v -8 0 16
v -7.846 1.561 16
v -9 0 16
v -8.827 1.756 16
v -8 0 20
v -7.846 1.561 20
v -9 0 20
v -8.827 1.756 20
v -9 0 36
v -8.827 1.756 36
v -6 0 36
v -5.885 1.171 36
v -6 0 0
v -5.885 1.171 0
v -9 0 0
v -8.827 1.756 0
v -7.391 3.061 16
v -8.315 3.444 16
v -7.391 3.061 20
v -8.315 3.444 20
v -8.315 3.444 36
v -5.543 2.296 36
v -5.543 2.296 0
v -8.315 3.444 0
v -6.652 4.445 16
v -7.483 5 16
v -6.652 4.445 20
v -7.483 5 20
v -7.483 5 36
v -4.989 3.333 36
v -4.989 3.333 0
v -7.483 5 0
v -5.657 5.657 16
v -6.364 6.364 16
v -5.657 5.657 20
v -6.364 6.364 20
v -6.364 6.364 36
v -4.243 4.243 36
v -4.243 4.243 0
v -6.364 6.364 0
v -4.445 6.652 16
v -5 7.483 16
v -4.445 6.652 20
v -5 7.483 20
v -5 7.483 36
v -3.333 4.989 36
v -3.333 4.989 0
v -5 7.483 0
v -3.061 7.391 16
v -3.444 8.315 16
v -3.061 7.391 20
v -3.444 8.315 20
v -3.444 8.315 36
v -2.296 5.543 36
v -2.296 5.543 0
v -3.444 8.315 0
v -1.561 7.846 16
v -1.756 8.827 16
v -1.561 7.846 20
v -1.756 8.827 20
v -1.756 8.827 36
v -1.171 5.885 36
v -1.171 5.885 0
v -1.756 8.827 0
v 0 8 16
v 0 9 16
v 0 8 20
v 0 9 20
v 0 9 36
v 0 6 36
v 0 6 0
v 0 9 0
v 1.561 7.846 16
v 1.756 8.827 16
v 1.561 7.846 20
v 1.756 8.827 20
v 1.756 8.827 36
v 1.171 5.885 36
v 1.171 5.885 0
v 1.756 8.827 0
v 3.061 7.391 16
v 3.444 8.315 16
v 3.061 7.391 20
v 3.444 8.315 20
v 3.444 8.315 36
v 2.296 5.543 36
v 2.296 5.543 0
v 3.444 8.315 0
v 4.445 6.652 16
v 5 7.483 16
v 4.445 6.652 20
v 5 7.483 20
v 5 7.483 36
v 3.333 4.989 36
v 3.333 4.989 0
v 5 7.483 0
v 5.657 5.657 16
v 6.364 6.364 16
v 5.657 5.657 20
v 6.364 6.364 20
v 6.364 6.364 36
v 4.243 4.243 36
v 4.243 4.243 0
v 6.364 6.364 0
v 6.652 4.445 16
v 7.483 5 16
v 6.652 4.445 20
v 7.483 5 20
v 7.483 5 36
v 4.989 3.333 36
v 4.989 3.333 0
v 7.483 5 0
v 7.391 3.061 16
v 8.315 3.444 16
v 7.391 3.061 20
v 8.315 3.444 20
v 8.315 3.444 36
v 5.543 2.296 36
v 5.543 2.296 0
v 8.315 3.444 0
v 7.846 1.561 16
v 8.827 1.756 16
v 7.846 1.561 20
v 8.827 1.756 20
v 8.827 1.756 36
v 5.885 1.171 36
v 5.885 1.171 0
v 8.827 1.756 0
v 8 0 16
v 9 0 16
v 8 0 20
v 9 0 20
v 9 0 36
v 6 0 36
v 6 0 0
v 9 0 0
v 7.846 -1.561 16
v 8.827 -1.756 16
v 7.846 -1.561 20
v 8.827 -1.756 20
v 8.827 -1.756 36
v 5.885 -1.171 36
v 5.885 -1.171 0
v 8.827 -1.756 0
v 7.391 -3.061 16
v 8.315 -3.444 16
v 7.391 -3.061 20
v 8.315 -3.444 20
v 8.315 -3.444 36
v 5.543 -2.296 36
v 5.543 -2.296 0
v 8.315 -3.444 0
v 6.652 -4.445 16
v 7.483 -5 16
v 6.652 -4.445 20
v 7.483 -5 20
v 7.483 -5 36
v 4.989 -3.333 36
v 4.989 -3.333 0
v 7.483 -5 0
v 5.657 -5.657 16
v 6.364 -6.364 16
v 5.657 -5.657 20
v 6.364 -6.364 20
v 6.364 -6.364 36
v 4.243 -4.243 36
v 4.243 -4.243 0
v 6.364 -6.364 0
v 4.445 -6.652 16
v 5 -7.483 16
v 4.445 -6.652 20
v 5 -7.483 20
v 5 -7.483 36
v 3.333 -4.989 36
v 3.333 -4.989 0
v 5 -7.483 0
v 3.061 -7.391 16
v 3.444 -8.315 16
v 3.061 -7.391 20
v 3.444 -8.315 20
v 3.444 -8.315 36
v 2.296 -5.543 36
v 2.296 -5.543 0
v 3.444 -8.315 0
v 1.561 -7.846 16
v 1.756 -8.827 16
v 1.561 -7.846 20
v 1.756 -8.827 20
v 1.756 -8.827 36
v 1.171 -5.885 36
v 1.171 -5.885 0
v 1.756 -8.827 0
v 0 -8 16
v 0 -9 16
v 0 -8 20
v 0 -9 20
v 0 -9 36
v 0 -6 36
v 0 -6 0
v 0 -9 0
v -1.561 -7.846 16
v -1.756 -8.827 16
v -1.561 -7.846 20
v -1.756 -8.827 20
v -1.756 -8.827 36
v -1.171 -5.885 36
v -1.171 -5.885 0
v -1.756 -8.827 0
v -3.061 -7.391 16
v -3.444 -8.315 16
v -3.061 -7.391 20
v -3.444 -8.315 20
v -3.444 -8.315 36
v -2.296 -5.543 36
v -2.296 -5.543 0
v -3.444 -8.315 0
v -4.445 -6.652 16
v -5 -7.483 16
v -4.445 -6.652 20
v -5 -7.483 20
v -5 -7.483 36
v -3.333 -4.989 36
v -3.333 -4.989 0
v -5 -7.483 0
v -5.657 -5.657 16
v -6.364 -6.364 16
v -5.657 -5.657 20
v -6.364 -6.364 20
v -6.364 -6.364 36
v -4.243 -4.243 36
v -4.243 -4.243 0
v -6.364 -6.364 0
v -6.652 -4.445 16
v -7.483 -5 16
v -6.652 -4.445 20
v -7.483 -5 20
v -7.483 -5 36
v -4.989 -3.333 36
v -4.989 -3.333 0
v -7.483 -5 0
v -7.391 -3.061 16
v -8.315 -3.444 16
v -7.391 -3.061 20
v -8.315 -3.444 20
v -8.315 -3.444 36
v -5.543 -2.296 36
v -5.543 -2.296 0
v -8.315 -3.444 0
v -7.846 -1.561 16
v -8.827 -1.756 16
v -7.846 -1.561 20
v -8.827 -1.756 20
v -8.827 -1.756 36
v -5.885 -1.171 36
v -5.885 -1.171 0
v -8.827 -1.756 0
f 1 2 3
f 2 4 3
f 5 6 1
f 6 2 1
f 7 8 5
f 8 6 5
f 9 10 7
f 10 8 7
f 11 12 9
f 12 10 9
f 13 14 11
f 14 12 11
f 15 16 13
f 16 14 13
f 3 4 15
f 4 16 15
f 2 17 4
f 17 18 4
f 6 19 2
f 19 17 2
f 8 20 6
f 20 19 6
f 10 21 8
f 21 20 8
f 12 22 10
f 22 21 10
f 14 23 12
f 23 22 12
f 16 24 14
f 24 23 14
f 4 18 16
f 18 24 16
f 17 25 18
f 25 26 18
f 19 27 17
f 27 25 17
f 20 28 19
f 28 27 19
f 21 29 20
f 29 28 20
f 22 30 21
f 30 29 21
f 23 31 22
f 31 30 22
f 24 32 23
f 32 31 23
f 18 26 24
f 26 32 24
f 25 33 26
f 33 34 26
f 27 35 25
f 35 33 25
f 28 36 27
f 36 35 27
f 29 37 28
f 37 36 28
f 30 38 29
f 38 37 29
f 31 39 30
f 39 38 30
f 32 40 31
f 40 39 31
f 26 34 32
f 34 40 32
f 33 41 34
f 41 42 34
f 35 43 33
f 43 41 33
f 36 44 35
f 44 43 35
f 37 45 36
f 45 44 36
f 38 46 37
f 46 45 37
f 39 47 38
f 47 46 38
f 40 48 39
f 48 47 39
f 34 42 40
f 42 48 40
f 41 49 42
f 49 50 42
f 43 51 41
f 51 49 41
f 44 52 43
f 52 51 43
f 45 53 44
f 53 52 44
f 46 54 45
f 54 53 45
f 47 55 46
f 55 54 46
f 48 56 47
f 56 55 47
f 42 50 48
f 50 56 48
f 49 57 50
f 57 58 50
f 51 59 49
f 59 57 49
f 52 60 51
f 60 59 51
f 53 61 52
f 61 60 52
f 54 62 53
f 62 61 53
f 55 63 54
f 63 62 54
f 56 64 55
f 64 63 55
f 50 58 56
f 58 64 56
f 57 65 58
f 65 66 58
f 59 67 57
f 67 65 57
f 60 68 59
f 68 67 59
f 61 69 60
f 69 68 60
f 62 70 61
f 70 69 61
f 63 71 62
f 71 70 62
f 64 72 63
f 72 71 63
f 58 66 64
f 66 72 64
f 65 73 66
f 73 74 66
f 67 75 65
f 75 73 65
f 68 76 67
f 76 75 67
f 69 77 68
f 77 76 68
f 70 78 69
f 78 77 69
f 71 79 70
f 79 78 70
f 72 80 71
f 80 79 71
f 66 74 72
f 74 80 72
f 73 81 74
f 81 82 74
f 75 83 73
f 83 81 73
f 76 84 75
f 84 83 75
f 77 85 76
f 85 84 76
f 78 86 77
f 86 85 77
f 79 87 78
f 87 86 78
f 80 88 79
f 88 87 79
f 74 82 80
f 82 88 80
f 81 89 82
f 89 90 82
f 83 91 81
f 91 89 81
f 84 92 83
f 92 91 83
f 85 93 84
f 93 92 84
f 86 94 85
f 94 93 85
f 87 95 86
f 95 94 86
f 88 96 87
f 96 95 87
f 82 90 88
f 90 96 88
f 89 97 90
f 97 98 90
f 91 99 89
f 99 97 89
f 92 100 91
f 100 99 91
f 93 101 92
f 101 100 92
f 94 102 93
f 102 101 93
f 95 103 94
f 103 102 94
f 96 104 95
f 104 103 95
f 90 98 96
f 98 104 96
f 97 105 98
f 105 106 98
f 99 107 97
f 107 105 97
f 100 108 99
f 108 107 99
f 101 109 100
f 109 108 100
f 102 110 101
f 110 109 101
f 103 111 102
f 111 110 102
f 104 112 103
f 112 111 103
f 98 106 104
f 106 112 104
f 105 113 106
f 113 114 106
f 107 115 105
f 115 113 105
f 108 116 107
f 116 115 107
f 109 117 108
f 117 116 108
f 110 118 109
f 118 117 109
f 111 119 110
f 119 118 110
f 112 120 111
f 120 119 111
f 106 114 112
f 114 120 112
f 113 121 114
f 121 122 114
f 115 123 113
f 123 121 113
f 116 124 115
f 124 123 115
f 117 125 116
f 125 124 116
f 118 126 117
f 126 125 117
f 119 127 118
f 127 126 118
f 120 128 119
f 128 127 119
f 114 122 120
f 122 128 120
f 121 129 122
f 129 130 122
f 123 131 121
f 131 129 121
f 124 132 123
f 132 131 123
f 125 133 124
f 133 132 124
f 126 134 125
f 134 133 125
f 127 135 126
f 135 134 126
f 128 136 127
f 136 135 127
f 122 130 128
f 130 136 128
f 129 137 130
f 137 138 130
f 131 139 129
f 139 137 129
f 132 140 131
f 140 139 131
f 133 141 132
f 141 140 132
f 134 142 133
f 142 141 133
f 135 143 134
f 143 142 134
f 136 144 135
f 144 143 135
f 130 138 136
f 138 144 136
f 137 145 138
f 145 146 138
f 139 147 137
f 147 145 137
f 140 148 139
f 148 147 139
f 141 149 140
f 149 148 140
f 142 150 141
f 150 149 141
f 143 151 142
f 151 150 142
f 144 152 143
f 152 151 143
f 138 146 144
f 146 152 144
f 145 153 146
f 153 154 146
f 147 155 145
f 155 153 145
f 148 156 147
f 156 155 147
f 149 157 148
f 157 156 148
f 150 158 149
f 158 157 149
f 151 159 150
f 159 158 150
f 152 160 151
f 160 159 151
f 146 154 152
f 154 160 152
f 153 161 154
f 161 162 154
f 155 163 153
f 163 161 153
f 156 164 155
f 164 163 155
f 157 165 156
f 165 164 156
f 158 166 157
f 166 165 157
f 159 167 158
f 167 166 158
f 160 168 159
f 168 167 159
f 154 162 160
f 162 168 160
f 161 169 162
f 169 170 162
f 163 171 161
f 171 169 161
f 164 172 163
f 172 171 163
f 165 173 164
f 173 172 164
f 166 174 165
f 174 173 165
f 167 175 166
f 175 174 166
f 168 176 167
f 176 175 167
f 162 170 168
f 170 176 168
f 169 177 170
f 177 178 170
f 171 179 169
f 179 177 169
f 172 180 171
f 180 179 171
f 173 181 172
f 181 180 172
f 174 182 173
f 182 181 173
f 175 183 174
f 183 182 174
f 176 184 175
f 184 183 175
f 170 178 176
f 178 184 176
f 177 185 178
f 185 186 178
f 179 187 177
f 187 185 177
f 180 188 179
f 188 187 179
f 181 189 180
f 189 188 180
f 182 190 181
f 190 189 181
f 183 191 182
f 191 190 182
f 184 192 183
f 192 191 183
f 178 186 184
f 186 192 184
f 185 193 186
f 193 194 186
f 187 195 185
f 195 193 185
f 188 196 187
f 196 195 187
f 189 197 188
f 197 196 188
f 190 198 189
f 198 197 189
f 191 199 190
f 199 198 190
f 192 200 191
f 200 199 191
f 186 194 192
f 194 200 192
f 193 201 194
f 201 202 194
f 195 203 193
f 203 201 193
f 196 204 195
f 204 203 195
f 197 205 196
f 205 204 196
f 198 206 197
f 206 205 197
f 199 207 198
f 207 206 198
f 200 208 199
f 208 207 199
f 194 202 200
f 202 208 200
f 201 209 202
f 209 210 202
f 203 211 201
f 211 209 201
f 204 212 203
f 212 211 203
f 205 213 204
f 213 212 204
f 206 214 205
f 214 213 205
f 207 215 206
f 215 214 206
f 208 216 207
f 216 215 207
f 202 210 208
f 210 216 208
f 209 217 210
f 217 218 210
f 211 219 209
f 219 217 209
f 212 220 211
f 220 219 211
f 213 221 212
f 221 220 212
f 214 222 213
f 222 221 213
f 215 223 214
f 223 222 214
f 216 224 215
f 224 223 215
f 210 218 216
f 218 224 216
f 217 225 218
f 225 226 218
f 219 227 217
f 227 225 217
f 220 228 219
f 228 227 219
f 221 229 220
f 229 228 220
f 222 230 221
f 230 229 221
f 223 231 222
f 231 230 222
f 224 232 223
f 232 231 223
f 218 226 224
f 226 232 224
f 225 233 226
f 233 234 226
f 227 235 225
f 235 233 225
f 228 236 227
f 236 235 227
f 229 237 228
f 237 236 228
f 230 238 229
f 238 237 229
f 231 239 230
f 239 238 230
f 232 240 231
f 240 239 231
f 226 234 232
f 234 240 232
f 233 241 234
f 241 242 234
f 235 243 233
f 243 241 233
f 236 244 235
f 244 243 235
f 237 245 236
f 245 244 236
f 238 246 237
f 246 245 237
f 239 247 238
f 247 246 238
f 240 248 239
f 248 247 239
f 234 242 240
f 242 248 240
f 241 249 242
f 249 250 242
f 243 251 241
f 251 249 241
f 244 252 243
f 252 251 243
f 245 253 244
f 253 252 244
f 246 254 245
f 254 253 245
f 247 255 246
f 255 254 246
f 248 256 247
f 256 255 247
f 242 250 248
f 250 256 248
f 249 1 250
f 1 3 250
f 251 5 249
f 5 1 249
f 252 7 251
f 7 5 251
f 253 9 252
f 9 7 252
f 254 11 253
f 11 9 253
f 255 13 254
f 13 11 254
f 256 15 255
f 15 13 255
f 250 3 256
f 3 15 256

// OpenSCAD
$fn = 32;

// ----------------------------------------------------------------------
// Grooved revolve: plain_grooves, bore R6
// ----------------------------------------------------------------------

// --- parameters (mm) ---
bore_r = 6;               // bore radius
outer_r = 9;              // outer radius of the body
total_h = 36;             // overall height, Z
wall = 3;                 // radial wall thickness
groove_w = 4;             // groove width
groove_d = 1;             // groove depth
grooves = 1;              // number of outer grooves

bbox_x = 2 * outer_r;  // full diameter
bore_d = 2 * bore_r;  // bore diameter
body_d = 2 * outer_r;  // body diameter
revolve_angle = 360;  // full turn around the Z axis

profile = [[6, 0], [9, 0], [9, 16], [8, 16], [8, 20], [9, 20], [9, 36], [6, 36]];  // primary outline, 8 points, counter clockwise

// --- the one profile operation ---
rotate_extrude(angle = revolve_angle) polygon(points = profile);
